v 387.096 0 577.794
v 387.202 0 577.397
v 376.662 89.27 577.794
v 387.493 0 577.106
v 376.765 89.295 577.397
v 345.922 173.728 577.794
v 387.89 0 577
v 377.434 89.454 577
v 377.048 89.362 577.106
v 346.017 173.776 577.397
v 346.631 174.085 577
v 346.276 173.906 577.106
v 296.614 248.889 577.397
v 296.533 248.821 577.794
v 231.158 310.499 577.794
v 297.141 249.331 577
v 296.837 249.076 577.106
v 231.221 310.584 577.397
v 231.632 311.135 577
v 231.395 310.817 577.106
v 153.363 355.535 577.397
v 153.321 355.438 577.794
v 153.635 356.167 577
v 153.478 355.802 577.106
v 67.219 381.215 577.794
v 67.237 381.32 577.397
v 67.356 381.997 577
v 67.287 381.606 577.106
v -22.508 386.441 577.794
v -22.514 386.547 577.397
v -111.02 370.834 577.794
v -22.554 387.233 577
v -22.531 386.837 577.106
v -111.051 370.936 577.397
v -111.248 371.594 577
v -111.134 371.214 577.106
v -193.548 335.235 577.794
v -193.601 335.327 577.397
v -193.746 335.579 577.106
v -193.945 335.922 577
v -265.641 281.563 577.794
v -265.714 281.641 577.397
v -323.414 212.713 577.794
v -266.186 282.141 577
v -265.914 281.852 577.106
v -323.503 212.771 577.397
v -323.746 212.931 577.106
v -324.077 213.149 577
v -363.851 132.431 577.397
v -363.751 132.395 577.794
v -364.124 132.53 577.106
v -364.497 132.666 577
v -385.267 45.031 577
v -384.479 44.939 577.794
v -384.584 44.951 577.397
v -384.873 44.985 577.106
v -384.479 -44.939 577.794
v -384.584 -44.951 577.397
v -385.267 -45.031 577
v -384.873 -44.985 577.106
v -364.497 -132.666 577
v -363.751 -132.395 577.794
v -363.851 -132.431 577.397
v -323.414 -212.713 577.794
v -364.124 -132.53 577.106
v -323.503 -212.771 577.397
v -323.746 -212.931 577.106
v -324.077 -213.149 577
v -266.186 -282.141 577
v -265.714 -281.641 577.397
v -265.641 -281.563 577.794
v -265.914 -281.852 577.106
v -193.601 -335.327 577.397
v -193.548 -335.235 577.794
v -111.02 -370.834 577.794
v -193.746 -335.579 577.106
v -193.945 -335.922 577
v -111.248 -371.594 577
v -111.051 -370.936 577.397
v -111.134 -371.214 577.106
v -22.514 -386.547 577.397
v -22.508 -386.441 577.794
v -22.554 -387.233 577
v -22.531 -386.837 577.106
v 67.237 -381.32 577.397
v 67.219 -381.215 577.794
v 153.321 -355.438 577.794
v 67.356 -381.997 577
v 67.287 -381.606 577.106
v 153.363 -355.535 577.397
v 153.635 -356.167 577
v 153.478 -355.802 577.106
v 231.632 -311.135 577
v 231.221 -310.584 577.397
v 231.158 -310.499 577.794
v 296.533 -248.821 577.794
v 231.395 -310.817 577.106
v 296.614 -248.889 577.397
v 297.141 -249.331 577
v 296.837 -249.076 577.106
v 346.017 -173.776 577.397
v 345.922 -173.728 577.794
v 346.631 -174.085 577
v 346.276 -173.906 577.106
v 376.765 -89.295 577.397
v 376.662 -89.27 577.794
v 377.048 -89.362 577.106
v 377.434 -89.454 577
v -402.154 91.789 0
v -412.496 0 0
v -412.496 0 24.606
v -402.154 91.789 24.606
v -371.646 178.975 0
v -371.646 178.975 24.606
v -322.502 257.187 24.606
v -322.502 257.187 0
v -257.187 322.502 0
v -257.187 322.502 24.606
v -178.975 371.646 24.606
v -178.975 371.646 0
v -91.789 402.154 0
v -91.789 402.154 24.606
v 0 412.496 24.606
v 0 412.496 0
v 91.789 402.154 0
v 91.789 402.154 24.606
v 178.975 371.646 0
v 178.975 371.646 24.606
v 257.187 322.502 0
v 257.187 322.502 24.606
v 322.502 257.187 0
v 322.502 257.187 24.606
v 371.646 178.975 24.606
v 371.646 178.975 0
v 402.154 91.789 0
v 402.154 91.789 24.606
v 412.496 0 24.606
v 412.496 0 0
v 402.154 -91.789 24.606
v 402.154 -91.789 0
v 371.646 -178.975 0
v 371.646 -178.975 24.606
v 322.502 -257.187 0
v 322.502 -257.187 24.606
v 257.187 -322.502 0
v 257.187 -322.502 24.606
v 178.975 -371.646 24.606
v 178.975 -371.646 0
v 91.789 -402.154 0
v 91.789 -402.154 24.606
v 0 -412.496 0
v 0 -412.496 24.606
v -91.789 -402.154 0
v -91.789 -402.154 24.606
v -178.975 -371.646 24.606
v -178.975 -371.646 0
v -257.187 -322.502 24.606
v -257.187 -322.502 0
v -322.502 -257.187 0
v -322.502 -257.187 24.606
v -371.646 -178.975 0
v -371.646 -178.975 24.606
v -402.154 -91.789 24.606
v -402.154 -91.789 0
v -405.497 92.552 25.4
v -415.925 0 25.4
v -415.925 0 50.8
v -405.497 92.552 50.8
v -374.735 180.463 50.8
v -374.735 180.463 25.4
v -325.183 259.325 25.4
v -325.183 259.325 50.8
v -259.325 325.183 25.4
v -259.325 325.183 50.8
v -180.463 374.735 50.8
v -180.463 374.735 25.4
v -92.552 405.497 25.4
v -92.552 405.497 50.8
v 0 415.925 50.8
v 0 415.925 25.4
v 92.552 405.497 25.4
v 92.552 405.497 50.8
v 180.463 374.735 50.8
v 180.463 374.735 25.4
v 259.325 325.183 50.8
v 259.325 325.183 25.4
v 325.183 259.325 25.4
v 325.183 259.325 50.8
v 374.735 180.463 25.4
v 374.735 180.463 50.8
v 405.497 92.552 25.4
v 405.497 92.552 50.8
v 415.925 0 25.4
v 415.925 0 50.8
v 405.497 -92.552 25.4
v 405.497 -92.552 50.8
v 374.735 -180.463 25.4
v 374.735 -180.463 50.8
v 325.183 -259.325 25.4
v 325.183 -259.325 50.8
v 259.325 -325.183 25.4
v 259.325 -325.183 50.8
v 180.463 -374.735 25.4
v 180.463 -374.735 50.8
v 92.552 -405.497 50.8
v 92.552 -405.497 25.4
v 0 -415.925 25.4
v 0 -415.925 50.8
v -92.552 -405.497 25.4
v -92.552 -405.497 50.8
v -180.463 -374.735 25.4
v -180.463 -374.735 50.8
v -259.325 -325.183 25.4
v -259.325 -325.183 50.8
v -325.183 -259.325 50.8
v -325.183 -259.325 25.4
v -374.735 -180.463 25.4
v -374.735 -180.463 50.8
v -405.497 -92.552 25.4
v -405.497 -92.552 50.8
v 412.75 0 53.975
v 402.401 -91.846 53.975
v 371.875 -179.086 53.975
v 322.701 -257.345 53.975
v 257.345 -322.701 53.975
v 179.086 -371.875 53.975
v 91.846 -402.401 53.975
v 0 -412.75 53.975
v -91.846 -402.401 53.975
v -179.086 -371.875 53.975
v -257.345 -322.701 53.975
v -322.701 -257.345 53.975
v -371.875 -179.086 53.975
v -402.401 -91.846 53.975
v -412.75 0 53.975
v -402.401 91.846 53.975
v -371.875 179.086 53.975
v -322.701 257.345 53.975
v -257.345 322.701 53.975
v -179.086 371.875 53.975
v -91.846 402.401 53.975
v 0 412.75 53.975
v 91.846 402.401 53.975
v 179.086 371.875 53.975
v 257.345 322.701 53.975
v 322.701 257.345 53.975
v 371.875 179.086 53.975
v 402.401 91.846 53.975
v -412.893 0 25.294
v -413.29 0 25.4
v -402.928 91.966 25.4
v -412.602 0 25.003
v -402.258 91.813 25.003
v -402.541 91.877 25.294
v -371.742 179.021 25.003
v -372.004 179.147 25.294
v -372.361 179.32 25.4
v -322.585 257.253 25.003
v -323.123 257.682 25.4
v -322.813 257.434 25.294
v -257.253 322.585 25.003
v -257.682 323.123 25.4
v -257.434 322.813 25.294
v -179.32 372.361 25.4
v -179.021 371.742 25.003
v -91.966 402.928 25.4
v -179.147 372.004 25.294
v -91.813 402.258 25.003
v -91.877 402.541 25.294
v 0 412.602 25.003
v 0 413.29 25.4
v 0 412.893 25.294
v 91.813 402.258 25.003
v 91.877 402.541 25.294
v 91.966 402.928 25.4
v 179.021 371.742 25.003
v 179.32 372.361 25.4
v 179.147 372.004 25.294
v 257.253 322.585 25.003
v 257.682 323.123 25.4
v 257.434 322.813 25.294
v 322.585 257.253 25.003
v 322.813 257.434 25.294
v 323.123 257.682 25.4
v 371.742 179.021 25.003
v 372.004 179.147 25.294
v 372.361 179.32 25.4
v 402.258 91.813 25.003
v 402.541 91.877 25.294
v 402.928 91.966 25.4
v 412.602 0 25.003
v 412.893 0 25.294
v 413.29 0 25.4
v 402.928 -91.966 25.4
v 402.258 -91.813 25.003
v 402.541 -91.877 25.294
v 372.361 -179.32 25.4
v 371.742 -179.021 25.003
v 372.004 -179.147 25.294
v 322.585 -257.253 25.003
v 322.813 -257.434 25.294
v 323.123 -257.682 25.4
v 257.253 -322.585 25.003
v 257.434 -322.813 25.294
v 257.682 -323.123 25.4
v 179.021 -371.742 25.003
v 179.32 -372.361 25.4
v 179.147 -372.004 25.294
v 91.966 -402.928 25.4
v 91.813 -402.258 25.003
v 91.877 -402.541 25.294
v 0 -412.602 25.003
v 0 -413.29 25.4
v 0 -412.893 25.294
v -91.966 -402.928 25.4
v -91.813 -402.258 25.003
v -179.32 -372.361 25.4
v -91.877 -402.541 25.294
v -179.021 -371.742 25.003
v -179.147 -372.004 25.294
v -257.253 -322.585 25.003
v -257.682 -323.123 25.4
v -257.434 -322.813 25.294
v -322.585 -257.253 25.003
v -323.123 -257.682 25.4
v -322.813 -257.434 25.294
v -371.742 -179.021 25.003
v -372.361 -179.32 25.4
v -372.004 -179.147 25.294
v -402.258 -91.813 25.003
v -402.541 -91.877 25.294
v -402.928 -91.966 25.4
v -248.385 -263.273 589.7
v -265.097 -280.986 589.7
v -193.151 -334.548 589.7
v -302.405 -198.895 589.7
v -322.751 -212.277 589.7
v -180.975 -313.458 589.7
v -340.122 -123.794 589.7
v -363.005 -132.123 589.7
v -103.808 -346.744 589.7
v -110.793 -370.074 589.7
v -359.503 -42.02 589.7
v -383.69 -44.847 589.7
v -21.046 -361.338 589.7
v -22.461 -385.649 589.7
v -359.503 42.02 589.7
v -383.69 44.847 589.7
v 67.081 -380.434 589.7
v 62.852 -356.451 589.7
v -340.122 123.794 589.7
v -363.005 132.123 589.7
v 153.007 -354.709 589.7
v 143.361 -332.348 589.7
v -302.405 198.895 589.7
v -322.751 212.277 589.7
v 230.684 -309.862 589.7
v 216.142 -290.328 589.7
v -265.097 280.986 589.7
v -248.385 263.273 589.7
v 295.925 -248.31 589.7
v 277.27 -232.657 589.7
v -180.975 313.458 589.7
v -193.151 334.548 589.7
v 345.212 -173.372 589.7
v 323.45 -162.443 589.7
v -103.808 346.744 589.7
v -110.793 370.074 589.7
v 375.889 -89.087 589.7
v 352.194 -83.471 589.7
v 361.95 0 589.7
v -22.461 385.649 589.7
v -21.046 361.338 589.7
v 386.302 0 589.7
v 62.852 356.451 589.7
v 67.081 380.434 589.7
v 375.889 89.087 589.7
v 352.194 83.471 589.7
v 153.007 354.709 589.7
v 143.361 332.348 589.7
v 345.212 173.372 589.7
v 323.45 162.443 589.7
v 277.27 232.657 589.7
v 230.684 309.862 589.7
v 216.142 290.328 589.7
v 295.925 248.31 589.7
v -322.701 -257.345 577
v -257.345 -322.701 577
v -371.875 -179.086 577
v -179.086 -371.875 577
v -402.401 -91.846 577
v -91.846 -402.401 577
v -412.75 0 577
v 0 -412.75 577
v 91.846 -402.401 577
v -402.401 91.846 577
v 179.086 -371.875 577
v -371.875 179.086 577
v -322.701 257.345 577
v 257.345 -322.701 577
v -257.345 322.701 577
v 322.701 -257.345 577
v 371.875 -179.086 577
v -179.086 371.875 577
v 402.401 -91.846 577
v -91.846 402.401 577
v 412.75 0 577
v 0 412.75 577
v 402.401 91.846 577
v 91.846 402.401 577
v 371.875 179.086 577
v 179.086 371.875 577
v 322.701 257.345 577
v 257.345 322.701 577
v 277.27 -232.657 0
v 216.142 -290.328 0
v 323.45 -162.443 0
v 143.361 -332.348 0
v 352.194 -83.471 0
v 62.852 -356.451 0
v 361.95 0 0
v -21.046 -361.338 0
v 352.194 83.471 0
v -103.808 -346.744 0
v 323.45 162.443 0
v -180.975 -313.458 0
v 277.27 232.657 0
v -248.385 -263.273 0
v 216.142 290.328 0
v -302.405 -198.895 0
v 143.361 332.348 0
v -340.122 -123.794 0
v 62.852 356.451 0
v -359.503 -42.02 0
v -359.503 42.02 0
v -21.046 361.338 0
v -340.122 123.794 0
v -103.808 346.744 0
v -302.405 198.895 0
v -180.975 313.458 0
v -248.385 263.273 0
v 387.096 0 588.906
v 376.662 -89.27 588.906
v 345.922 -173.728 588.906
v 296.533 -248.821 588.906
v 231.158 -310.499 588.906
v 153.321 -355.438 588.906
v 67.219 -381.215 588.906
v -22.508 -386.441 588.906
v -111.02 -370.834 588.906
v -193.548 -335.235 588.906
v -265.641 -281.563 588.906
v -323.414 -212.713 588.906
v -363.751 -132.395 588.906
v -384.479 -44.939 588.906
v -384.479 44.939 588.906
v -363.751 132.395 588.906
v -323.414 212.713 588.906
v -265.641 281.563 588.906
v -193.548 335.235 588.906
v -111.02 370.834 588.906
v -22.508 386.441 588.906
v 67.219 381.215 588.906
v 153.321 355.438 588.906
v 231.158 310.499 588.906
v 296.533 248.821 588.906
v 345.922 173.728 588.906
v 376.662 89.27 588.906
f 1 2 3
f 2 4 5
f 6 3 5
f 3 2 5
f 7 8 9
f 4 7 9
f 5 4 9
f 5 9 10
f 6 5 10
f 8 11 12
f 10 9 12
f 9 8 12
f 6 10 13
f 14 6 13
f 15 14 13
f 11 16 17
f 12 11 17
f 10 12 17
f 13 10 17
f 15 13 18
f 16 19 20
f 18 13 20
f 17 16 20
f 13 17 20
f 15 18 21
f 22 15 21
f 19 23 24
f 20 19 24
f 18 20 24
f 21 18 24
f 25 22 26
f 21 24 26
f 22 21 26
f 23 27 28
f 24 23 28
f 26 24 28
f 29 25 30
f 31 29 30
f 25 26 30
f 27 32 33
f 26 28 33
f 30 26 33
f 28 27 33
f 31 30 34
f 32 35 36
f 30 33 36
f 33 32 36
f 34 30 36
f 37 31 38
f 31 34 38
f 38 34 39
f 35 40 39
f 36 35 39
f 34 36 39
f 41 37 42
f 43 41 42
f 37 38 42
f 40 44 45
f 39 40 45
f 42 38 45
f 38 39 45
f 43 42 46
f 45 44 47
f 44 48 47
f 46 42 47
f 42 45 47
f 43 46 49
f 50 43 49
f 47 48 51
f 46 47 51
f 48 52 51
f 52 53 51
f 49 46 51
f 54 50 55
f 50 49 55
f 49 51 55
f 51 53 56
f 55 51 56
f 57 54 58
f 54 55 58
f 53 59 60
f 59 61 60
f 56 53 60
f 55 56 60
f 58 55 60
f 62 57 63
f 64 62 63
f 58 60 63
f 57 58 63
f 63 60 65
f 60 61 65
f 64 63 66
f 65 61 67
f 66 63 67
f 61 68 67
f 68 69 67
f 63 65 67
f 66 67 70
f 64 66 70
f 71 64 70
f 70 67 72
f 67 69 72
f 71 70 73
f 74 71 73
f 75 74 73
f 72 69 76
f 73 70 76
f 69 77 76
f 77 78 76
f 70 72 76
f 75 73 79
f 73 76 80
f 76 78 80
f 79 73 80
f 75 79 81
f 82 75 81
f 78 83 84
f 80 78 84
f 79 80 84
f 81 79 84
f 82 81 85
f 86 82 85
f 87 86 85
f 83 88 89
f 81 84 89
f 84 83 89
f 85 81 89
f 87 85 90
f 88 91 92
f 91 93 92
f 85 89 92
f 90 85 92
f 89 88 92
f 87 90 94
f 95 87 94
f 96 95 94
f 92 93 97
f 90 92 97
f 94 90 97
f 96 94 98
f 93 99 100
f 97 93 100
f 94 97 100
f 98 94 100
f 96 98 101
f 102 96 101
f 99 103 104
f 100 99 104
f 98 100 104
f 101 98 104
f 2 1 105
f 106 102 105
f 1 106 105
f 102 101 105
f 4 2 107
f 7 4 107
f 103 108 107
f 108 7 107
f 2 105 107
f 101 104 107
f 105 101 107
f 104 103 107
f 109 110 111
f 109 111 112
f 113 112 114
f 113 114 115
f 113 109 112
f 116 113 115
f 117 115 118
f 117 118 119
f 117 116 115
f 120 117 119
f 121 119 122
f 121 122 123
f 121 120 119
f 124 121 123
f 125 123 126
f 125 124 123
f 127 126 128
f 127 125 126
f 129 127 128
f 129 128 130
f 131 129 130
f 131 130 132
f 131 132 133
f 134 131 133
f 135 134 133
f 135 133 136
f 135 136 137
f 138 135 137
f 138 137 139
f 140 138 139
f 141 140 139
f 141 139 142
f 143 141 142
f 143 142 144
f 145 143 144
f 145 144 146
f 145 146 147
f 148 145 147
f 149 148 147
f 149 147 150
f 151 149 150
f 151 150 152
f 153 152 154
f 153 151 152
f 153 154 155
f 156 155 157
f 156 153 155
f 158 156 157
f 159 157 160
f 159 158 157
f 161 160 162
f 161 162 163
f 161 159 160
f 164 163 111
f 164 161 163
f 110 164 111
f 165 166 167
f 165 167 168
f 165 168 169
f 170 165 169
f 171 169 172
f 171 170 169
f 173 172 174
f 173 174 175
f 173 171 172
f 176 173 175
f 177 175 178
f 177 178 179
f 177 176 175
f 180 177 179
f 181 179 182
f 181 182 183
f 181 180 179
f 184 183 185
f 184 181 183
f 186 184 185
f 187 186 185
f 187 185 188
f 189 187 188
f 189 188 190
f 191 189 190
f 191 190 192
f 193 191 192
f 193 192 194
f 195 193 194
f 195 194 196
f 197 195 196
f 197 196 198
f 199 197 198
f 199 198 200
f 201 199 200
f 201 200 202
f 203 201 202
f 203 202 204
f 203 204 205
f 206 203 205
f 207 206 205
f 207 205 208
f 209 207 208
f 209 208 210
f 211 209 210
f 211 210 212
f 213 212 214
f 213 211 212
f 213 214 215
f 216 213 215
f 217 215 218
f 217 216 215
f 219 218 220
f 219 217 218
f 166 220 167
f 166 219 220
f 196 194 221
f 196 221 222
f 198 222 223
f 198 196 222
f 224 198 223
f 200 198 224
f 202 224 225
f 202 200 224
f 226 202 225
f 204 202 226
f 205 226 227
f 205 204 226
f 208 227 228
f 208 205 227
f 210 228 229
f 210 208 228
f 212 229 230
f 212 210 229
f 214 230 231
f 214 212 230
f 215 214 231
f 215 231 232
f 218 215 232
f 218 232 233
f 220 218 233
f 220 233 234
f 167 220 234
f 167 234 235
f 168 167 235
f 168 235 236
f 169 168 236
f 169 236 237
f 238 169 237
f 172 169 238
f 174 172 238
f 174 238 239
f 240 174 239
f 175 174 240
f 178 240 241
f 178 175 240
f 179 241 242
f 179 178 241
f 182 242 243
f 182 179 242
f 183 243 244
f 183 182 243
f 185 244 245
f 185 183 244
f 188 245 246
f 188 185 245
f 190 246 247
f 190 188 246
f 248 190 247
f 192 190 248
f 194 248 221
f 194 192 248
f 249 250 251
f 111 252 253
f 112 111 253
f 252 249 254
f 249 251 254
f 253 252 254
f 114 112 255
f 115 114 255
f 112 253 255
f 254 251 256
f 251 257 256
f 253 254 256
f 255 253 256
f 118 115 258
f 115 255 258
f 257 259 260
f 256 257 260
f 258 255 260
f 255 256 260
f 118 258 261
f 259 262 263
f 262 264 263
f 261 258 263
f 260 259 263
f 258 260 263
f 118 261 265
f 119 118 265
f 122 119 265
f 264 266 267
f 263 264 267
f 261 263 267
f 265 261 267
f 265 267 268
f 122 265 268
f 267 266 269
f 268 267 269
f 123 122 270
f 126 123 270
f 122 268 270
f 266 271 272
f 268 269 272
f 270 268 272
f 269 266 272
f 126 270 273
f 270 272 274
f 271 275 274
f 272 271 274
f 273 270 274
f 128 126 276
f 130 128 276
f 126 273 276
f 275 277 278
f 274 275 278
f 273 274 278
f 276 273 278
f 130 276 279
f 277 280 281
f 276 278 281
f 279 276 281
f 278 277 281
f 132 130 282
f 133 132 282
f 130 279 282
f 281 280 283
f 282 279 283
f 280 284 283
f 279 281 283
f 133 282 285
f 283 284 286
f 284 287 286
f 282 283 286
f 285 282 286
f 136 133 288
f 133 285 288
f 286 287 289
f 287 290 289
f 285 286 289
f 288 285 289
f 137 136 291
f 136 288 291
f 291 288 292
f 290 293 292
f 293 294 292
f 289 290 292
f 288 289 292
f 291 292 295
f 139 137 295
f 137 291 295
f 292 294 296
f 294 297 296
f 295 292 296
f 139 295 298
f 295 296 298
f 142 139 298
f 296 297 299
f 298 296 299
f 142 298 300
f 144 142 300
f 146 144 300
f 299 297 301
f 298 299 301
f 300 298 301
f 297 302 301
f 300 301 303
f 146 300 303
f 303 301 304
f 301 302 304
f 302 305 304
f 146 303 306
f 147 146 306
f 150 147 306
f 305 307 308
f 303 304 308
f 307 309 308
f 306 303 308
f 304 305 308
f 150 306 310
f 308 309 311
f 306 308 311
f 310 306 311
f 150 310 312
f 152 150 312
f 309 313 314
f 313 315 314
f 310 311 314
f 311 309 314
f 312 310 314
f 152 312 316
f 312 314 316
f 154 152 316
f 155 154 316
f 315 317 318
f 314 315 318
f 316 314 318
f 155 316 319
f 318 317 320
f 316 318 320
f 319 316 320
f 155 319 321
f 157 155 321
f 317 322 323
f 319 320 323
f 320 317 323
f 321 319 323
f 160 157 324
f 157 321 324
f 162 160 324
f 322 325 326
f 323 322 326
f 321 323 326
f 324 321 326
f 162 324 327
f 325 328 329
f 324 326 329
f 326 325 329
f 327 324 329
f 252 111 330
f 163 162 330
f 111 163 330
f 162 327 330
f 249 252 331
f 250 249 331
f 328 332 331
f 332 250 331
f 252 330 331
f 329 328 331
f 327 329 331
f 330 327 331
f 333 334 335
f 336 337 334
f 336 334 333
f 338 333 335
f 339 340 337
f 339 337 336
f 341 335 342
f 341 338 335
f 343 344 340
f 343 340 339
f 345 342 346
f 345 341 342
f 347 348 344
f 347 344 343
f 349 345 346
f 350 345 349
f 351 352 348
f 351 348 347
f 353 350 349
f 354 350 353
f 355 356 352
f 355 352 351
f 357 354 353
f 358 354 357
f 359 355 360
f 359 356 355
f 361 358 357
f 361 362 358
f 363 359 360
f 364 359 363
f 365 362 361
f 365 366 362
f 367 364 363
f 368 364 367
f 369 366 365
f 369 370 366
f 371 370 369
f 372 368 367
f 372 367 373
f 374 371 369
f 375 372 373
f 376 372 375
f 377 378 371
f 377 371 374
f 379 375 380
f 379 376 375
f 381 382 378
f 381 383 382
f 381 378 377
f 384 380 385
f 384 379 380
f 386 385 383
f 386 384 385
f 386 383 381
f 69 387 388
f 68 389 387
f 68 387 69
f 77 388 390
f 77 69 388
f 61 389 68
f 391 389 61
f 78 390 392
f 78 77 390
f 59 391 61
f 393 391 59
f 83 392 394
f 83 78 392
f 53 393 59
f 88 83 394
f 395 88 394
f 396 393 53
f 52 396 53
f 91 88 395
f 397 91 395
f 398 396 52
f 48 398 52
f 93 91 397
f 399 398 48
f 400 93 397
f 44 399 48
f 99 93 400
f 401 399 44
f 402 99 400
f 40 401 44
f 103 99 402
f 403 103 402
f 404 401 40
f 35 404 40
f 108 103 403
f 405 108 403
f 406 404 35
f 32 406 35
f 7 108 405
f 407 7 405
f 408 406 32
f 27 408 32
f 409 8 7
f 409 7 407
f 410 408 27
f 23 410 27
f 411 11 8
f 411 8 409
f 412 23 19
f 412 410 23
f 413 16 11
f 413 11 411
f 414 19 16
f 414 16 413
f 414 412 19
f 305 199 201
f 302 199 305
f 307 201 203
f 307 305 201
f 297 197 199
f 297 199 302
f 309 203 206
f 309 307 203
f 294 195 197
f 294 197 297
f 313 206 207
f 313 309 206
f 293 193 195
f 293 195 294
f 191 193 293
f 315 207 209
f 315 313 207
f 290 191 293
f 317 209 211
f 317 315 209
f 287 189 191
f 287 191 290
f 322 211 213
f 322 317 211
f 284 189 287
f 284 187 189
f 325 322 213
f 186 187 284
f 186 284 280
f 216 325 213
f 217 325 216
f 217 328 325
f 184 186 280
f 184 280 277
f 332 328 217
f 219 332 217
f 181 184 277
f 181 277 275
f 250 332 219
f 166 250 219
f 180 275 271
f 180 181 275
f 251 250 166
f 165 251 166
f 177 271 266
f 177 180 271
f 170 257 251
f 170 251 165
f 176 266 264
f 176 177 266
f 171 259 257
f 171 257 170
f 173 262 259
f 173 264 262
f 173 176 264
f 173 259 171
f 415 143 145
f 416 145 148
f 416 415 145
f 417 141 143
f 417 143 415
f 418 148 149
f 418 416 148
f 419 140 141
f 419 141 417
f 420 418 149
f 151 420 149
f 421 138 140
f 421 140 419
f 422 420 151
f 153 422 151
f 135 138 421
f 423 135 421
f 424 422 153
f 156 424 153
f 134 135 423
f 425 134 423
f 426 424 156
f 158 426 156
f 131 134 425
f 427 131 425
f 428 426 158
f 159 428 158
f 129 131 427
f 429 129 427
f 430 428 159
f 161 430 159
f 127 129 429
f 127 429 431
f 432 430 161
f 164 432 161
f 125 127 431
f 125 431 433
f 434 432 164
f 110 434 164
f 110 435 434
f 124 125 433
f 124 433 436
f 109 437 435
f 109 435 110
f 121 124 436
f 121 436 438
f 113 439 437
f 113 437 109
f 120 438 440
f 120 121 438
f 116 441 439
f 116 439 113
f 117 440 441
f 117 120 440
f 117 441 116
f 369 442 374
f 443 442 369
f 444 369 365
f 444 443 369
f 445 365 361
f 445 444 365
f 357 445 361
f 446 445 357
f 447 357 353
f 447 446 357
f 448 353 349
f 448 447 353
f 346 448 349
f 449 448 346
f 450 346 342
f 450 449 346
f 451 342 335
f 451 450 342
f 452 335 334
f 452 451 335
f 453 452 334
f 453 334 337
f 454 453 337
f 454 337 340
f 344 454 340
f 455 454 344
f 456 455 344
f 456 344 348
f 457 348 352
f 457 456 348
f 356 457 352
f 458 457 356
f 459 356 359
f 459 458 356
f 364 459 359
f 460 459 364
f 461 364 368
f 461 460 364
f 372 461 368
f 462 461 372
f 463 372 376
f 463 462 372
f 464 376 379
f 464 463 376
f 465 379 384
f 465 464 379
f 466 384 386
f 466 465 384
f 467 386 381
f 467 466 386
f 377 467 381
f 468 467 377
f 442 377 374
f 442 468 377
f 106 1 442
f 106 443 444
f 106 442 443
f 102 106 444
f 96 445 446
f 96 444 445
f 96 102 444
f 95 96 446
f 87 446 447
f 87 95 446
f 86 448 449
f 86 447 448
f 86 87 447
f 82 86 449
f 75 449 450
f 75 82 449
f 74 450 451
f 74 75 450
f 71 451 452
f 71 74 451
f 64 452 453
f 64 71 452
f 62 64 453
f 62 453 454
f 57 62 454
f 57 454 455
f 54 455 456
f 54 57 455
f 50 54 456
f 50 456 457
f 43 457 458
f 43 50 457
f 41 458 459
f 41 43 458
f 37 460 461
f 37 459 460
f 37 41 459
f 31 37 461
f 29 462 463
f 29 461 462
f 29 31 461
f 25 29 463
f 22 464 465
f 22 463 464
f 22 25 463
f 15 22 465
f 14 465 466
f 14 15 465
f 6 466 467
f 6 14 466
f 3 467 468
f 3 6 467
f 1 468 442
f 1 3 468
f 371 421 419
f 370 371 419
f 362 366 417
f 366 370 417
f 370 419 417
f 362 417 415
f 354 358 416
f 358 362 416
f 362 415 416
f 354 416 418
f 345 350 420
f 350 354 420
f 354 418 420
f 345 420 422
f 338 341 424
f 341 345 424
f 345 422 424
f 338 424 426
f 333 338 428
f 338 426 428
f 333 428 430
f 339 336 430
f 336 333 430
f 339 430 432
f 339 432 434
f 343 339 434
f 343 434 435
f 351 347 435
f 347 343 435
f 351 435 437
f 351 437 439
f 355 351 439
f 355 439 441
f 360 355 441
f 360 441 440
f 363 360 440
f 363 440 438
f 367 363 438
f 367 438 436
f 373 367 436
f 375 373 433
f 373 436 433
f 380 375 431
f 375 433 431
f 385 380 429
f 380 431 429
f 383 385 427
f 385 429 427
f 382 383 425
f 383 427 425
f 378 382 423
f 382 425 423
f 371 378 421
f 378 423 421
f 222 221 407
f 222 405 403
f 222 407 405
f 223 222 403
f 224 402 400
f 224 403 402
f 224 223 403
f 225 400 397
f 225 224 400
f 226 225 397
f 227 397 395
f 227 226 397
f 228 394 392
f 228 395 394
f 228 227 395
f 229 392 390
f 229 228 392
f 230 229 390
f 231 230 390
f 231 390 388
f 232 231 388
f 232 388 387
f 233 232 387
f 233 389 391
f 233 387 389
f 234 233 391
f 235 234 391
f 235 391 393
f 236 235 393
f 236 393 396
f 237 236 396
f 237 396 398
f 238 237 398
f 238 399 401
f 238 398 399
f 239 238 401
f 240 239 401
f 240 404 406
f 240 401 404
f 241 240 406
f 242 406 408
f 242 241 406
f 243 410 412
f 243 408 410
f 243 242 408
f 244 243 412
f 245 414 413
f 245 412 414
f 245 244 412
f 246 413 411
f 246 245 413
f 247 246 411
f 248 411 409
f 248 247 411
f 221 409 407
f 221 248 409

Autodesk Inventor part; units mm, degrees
ref_plane "YZ Plane" through (0, 0, 0) normal (1, 0, 0) x (0, 1, 0)
ref_plane "XZ Plane" through (0, 0, 0) normal (0, 1, 0) x (-1, 0, 0)
ref_plane "XY Plane" through (0, 0, 0) normal (0, 0, 1) x (1, 0, 0)
sketch "Sketch1" plane through (0, 0, 0) normal (0, 0, 1) x (1, 0, 0)
  circle A0 centre (0, 0) radius 361.95
  circle A1 centre (0, 0) radius 412.75
  dimension "d0" = 723.9
  dimension "d1" = 825.5
extrude "Extrusion1" add sketch "Sketch1" along normal blind 577
sketch "Sketch2" plane through (0, 0, 0) normal (0, 0, -1) x (-1, 0, 0)
  circle A0 centre (0, 0) radius 412.75 projected
  circle A1 centre (0, 0) radius 415.925
  dimension "d4" = 831.85
extrude "Extrusion2" add sketch "Sketch2" against normal blind 50.8
sketch "Sketch3" plane through (0, 0, 0) normal (0, 0, -1) x (-1, 0, 0)
  circle A0 centre (0, 0) radius 415.925 projected
  circle A1 centre (0, 0) radius 412.496
  dimension "d7" = 824.992
extrude "Extrusion3" cut sketch "Sketch3" against normal blind 25.4
chamfer "Chamfer1" distance 3.175 angle 45 1 edges at (-412.75, 0, 50.8)
sketch "Sketch4" plane through (0, 0, 577) normal (0, 0, 1) x (1, 0, 0)
  circle A0 centre (0, 0) radius 361.95 projected
  circle A1 centre (0, 0) radius 387.096
  dimension "d13" = 774.192
extrude "Extrusion4" add sketch "Sketch4" along normal blind 12.7
fillet "Fillet1" radius 0.7937 2 edges at (-387.096, 0, 577) (412.496, 0, 25.4)
chamfer "Chamfer2" distance 0.7937 angle 45 1 edges at (-387.096, 0, 589.7)
equation "\"d10\" = -0.5 * d1 + 0.5 * d4"
properties part number "A1-19027-100-06 HCWI liner - pup" material "Iron, HCWI"
